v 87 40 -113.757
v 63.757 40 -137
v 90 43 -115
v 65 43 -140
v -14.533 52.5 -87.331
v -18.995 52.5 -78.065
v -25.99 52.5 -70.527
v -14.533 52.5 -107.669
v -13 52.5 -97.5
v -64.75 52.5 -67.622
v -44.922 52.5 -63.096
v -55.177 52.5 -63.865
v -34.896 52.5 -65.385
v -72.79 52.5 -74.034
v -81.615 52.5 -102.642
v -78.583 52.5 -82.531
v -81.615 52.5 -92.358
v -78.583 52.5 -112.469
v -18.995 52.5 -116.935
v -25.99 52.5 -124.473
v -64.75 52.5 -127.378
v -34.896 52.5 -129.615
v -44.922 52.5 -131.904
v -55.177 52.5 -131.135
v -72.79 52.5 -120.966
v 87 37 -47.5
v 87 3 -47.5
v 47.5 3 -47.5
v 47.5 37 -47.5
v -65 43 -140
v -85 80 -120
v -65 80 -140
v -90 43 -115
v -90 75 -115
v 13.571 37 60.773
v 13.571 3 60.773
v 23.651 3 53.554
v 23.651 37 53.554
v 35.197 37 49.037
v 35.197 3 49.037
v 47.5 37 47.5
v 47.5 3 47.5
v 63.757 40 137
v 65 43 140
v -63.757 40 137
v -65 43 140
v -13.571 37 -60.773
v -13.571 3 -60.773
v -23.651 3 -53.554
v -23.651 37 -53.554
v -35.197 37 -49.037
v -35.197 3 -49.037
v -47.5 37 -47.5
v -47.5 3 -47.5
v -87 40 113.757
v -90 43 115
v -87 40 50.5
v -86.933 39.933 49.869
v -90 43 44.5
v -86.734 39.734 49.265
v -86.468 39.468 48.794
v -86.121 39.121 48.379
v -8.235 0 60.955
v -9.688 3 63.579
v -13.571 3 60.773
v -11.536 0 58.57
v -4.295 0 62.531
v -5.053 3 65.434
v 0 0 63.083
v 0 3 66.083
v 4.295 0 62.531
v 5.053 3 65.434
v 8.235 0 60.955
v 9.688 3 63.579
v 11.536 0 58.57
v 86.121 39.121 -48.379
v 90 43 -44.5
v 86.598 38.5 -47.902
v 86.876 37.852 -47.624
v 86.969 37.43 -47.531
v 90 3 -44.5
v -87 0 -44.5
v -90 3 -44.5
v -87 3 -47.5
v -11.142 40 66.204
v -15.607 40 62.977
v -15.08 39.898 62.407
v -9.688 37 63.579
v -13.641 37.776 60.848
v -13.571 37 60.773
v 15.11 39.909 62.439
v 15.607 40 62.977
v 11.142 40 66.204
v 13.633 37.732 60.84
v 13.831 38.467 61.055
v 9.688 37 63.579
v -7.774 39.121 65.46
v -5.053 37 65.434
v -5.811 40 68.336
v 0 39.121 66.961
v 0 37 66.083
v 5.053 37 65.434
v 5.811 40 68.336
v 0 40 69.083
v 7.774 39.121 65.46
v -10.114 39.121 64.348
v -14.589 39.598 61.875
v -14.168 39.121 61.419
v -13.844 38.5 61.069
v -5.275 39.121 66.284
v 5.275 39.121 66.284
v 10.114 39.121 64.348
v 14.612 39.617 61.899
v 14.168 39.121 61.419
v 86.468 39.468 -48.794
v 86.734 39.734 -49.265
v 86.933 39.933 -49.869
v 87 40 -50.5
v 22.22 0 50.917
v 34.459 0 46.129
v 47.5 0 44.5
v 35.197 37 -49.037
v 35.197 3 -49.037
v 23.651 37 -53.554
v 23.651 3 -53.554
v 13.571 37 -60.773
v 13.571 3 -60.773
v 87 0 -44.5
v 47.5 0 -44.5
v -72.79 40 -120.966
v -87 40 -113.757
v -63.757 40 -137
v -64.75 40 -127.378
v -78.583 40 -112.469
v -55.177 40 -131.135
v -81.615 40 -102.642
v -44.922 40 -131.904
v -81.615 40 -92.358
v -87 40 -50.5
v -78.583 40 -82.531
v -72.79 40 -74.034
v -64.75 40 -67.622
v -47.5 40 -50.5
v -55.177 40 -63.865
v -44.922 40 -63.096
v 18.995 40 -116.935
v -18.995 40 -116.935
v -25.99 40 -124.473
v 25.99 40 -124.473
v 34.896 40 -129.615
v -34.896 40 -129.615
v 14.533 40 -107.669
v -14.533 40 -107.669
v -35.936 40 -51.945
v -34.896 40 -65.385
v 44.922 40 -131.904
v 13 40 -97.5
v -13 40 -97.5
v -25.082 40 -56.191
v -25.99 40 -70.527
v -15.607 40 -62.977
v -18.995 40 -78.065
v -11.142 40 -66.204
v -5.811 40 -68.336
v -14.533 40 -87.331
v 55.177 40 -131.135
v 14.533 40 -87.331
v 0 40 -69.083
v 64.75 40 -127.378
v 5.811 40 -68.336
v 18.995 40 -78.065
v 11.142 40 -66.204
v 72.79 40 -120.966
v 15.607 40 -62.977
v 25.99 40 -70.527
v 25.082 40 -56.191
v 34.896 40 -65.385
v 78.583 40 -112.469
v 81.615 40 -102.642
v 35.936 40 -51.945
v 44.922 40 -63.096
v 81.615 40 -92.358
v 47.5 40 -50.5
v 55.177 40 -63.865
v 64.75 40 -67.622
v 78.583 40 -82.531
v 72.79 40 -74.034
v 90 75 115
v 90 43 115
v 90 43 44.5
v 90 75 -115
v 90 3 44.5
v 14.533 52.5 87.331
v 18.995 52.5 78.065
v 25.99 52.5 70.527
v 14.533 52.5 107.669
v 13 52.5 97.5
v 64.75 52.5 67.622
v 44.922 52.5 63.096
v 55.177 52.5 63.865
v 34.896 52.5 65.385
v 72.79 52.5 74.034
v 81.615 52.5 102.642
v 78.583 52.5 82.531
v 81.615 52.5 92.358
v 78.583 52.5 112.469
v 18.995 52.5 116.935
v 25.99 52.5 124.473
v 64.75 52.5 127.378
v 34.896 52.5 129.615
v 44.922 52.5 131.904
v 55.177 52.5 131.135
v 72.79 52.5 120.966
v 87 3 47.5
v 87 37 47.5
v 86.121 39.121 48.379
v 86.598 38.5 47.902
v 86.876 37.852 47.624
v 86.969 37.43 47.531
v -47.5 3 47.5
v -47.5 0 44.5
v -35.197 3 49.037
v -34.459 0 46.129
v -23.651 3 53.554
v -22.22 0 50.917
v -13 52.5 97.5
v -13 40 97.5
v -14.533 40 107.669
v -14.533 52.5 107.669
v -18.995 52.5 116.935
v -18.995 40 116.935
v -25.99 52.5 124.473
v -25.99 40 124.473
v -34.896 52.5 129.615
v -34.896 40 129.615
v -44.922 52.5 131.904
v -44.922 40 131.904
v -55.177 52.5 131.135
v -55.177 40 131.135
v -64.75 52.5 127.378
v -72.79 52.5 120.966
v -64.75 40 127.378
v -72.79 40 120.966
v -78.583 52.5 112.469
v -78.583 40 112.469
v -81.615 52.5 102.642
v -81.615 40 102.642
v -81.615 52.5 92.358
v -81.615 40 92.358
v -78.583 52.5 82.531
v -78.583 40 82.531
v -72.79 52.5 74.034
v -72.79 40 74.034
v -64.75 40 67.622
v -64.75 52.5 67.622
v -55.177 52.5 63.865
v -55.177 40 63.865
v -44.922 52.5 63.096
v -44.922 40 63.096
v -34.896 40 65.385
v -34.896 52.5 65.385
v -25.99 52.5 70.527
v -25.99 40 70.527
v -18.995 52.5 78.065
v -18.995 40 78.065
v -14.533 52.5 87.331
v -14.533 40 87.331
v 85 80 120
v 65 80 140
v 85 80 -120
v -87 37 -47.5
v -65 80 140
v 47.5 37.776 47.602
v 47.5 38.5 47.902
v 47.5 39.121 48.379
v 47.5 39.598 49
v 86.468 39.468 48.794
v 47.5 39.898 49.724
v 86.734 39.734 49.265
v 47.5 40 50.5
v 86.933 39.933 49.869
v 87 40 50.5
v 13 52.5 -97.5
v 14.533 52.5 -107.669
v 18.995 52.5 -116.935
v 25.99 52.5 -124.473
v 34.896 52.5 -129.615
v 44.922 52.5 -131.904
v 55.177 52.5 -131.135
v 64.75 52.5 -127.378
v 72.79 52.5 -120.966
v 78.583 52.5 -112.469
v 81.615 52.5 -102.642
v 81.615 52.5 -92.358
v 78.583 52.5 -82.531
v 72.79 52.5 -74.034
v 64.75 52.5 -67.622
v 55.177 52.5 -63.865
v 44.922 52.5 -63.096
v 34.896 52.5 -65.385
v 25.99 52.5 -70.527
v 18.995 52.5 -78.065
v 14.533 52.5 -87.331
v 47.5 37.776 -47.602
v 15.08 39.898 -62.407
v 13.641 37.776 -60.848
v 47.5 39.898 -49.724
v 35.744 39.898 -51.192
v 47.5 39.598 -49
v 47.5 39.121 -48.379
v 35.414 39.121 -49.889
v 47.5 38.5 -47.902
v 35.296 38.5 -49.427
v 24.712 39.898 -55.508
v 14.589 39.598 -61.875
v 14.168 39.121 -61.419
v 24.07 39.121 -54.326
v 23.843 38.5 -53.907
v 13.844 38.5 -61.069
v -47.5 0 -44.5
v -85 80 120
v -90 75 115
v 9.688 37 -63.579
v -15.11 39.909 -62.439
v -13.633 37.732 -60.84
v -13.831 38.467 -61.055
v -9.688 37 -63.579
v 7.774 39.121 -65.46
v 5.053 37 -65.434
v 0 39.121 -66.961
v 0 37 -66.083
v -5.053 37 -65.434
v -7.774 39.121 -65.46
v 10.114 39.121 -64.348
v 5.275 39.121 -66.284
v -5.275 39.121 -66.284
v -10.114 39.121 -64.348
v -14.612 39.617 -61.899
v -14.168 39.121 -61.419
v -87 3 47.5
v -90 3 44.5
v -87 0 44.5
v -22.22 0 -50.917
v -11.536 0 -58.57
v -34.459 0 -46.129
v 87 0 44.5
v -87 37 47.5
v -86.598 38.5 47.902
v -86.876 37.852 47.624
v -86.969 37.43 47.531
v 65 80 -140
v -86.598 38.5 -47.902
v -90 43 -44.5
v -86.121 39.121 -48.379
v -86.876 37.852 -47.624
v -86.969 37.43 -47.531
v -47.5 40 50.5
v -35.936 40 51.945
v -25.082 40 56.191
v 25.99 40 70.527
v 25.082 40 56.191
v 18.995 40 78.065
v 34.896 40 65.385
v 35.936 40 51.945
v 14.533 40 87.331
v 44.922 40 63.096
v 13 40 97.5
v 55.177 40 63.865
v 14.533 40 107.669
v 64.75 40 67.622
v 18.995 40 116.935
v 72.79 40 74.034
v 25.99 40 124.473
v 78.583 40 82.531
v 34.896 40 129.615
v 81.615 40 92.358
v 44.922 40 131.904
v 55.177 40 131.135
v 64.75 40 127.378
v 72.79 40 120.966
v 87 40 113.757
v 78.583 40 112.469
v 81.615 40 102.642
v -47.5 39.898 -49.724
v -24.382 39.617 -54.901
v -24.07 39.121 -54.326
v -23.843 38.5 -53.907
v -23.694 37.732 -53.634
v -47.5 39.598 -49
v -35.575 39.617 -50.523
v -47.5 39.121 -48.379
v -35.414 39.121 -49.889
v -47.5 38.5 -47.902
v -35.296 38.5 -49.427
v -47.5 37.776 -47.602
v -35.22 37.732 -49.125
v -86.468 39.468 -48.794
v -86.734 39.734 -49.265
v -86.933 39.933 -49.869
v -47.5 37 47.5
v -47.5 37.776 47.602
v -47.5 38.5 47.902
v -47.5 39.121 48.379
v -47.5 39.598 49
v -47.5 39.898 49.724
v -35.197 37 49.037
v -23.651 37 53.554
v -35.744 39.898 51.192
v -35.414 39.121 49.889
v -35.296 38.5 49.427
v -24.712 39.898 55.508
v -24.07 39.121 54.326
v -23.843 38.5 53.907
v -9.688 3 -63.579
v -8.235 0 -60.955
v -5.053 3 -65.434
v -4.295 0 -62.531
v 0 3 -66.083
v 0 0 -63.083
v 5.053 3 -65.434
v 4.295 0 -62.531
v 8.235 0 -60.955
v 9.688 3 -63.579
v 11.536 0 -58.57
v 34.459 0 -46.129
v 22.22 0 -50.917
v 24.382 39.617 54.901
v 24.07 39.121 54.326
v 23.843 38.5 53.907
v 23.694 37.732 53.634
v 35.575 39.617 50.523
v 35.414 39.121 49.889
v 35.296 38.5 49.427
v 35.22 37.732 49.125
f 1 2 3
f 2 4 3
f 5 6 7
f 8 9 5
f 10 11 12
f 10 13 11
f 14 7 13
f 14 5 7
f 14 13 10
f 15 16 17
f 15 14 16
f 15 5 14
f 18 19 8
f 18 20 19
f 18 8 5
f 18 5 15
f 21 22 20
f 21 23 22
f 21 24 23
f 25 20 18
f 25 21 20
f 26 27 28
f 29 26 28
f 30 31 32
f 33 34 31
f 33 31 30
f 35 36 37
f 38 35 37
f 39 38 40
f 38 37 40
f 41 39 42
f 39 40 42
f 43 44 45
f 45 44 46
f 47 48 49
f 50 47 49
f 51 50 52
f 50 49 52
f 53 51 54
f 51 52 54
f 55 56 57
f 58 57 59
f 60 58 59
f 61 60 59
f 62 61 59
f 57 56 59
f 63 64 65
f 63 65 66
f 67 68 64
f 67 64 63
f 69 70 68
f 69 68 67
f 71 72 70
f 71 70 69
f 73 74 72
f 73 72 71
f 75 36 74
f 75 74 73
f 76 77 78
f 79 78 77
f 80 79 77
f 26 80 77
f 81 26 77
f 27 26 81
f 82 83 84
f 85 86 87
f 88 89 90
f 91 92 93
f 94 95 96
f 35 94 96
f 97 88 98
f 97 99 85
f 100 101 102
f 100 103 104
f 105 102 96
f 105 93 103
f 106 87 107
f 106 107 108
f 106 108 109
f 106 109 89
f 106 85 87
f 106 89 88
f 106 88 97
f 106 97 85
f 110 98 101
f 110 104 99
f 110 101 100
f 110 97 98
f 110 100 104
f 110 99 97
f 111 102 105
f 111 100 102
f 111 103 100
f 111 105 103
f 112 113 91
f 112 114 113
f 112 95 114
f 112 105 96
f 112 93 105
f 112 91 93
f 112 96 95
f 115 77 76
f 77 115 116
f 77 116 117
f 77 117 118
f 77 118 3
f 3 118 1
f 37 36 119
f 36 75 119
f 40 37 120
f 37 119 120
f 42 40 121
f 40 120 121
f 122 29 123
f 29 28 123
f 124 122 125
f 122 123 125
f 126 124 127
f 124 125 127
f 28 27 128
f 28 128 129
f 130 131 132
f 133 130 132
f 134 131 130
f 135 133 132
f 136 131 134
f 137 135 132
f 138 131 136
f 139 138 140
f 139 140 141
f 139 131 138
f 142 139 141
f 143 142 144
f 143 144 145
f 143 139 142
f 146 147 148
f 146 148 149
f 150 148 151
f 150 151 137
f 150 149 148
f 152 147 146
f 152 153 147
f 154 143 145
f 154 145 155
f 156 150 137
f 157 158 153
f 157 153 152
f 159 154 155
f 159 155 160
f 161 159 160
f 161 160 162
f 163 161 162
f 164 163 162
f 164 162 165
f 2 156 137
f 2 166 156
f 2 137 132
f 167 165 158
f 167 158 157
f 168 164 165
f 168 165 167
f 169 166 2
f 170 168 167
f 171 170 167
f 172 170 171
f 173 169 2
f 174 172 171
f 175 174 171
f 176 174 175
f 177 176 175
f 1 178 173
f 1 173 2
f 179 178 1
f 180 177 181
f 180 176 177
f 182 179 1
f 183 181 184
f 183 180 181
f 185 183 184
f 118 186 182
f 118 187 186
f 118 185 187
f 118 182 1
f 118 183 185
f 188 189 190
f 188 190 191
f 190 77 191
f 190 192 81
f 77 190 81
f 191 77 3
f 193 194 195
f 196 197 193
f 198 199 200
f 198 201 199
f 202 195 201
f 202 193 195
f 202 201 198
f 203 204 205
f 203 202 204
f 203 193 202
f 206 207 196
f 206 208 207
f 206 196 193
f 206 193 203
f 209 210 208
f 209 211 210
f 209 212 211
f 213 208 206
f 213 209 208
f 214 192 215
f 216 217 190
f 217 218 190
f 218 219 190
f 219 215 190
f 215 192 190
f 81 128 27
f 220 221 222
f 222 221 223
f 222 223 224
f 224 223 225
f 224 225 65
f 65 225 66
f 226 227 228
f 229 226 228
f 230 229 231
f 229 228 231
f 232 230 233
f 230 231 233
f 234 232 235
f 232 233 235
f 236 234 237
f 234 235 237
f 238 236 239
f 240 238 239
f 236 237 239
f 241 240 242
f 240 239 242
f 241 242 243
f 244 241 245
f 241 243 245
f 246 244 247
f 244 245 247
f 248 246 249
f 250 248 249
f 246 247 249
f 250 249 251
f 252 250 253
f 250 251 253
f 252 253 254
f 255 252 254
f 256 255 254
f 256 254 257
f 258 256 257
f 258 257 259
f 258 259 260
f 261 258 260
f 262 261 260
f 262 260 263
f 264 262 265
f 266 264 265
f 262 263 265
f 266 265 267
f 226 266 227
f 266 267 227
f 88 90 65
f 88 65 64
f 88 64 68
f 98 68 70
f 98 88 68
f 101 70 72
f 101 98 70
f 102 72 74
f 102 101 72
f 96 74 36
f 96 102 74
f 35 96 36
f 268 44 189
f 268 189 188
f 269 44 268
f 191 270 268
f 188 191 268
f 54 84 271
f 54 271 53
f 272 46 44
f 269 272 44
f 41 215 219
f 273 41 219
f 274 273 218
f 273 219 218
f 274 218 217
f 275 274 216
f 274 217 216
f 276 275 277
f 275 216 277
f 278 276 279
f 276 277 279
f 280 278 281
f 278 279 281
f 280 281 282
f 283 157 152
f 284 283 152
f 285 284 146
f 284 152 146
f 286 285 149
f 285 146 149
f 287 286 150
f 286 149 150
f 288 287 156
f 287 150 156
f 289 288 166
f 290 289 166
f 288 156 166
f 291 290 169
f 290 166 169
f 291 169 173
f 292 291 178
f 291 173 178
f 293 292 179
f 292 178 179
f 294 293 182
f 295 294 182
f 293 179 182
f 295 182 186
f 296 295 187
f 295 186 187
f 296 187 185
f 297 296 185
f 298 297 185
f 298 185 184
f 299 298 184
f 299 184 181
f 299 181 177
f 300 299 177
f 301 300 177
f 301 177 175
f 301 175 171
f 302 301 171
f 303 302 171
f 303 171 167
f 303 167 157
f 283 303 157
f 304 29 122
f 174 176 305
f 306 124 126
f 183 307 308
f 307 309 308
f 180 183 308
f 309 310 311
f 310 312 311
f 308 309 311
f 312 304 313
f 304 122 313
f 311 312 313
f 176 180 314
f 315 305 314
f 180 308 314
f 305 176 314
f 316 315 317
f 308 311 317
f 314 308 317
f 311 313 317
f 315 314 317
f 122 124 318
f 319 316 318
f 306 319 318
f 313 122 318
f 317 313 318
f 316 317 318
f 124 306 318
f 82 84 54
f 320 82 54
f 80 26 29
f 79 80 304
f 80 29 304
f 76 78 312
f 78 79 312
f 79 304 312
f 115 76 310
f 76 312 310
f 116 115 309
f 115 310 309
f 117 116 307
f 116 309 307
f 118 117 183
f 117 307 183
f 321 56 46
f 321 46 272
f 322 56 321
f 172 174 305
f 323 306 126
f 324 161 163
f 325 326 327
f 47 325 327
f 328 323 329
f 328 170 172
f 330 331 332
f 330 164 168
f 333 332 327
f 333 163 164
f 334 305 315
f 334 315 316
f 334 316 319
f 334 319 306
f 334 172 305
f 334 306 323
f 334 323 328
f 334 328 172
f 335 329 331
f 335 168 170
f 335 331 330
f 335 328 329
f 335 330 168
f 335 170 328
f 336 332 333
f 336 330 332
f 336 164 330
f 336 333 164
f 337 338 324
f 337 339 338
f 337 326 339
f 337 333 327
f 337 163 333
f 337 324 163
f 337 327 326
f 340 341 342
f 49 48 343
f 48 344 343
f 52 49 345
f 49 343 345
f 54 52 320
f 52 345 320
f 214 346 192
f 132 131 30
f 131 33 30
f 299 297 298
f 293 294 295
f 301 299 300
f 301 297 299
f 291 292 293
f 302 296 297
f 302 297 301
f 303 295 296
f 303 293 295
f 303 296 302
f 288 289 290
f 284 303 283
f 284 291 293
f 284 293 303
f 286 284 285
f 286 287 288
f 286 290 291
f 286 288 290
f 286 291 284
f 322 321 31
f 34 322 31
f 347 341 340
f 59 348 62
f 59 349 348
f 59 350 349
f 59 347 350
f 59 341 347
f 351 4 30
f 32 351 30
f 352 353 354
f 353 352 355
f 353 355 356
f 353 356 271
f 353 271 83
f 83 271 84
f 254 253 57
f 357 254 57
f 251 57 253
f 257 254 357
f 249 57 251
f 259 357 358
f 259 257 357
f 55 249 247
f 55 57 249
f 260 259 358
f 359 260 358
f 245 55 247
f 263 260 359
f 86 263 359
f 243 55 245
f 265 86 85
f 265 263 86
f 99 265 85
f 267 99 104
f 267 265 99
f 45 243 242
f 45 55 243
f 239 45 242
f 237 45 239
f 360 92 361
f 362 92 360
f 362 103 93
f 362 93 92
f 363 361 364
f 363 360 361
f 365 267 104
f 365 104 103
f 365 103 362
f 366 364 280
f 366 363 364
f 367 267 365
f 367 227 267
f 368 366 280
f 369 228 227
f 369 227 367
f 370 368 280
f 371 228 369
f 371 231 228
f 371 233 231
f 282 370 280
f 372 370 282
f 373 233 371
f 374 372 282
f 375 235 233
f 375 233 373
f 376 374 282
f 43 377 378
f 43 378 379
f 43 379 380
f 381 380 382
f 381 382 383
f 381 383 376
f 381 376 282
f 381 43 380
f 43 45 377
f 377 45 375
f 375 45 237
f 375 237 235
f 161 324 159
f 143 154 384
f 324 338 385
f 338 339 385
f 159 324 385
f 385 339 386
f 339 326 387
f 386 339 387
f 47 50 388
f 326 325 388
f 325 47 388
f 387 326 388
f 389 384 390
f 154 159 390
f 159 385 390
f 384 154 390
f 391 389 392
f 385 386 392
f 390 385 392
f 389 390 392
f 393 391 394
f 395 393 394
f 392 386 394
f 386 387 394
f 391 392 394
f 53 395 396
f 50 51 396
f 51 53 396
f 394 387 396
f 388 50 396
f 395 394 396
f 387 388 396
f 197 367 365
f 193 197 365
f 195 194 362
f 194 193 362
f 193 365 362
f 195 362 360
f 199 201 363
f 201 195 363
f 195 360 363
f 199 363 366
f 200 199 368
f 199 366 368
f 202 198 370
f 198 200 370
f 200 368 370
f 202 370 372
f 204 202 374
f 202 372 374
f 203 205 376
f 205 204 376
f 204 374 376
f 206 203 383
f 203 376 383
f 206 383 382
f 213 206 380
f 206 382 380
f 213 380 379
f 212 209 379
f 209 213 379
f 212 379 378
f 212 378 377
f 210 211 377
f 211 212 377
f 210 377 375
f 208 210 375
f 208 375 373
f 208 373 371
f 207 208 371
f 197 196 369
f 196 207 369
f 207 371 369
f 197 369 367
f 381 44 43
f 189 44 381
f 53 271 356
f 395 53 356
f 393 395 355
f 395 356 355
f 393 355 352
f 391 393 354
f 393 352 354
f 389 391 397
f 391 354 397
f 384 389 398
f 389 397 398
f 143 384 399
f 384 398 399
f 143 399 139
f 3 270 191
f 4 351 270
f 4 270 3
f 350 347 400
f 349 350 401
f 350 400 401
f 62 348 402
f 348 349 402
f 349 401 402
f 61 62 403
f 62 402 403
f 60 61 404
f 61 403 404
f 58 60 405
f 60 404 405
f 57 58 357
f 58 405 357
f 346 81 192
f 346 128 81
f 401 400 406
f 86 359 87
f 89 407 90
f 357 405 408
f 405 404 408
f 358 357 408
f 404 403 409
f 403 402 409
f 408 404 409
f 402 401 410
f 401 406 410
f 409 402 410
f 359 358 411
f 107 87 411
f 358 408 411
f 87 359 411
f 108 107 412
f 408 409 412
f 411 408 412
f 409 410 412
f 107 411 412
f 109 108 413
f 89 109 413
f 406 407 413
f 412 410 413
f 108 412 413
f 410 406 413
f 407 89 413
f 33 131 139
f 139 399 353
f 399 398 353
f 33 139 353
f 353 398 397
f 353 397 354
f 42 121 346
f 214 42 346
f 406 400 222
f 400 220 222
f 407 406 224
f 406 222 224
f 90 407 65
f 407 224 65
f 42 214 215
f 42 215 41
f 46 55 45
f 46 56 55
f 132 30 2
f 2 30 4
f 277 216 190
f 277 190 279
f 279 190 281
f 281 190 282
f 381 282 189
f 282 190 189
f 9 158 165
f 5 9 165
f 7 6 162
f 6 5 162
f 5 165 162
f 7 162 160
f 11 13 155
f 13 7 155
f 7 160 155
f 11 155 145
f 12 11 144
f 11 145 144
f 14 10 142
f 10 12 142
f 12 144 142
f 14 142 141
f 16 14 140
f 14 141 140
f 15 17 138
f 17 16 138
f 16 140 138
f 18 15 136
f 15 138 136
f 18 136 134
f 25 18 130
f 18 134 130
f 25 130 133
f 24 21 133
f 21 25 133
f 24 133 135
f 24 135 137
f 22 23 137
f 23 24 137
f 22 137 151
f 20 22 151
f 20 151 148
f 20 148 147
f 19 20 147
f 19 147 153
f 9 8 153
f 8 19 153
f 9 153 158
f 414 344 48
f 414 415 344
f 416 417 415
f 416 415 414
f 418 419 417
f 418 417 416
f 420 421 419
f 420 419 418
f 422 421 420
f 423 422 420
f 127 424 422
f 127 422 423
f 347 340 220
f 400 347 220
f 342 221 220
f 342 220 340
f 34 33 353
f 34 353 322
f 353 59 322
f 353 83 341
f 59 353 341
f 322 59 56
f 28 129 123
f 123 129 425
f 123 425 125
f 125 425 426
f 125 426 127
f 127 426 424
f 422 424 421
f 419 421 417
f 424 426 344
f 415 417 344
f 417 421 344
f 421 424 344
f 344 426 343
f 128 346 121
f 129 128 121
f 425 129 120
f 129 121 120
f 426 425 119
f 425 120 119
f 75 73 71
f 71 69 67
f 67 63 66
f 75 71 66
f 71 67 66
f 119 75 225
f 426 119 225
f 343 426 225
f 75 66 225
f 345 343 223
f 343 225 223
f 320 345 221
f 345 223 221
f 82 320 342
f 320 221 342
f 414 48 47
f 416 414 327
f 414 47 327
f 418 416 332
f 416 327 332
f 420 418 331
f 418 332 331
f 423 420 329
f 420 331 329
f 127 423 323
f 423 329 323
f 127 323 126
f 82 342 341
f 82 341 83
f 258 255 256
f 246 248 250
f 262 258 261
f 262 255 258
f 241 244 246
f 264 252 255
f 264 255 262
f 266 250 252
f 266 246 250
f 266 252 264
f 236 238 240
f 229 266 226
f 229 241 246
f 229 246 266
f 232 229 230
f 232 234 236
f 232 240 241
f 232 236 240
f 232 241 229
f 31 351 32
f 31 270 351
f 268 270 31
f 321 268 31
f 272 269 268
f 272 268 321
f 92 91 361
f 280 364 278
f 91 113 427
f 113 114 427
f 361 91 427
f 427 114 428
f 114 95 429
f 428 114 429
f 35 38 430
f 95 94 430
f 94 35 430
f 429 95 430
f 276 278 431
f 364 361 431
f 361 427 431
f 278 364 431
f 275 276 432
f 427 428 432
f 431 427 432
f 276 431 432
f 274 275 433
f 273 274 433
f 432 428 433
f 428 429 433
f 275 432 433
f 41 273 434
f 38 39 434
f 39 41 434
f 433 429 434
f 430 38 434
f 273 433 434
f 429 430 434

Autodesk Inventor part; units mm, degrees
ref_plane "YZ Plane" through (0, 0, 0) normal (1, 0, 0) x (0, 1, 0)
ref_plane "XZ Plane" through (0, 0, 0) normal (0, 1, 0) x (-1, 0, 0)
ref_plane "XY Plane" through (0, 0, 0) normal (0, 0, 1) x (1, 0, 0)
sketch "Sketch1" plane through (0, 0, 0) normal (0, 1, 0) x (-1, 0, 0)
  line L0 (-90, -140) -> (90, -140)
  line L1 (90, -140) -> (90, 140)
  line L2 (90, 140) -> (-90, 140)
  line L3 (-90, 140) -> (-90, -140)
  line L4 (-90, -140) -> (90, 140) construction
  line L5 (90, -140) -> (-90, 140) construction
  point P0 (0, 0)
  dimension "d0" = 280
  dimension "d1" = 180
extrude "Extrusion1" add sketch "Sketch1" along normal blind 80
sketch "Sketch2" plane through (0, 0, 0) normal (0, -1, 0) x (1, 0, 0)
  arc A0 (-47.5, 47.5) -> (2.5, 97.5) centre (-47.5, 97.5) ccw
  line L0 (0, 150) -> (0, -153.5615) construction
  line L1 (-95.9498, 0) -> (75.0535, 0) construction
  line L2 (2.5, 97.5) -> (2.5, 140)
  line L3 (-90, 47.5) -> (-47.5, 47.5)
  line L4 (-90, -140) -> (-90, 140) projected
  line L5 (-90, 47.5) -> (-90, 140)
  line L6 (-90, 140) -> (90, 140) projected
  line L7 (2.5, 140) -> (-90, 140)
  arc A1 (-2.5, 97.5) -> (47.5, 47.5) centre (47.5, 97.5) ccw
  line L8 (-2.5, 97.5) -> (-2.5, 140)
  line L9 (90, 47.5) -> (47.5, 47.5)
  line L10 (90, -140) -> (90, 140)
  line L11 (90, 140) -> (-90, 140)
  arc A2 (2.5, -97.5) -> (-47.5, -47.5) centre (-47.5, -97.5) ccw
  line L12 (2.5, -97.5) -> (2.5, -140)
  line L13 (-90, -47.5) -> (-47.5, -47.5)
  line L14 (-90, 140) -> (-90, -140)
  line L15 (-90, -140) -> (90, -140)
  line L16 (90, 140) -> (90, -140)
  line L17 (90, -47.5) -> (47.5, -47.5)
  arc A3 (47.5, -47.5) -> (-2.5, -97.5) centre (47.5, -97.5) ccw
  line L18 (-2.5, -97.5) -> (-2.5, -140)
  circle A4 centre (-47.5, 97.5) radius 34.5
  circle A5 centre (-47.5, 97.5) radius 42 construction
  line L19 (-89.5, 97.5) -> (-5.5, 97.5) construction
  line L20 (-47.5, 139.5) -> (-47.5, 55.5) construction
  line L21 (-77.1985, 127.1985) -> (-17.8015, 67.8015) construction
  line L22 (-17.8015, 127.1985) -> (-77.1985, 67.8015) construction
  point P0 (0, 0)
  point P1 (-2.5, -140)
  point P2 (90, -47.5)
  point P3 (-90, -47.5)
  point P4 (-2.5, 140)
  point P5 (75, -50)
  point P6 (-75, -50)
  dimension "d15" = 84
  dimension "d7" = 90
  dimension "d11" = 50
  dimension "d14" = 69
  dimension "d16" = 45
  dimension "d17" = 45
  dimension "d35" = 42.5
  dimension "d36" = 42.5
extrude "Extrusion2" cut sketch "Sketch2" against normal blind 40 contours L3 L4 L6 L8 A1 A0 | A1 L8 L6 L2 A0 | A0 L2 L6 L10 L9 A1 | L13 A2 A3 L18 L15 L4 | L10 L15 L12 A2 A3 L17 | L18 A3 A2 L12 L15 | A4
extrude "Extrusion3" cut sketch "Sketch2" against normal blind 12.5 from surface at -40 contours A4
mirror "Mirror1" about plane through (0, 0, 0) normal (0, 0, 1) of "Extrusion3"
mirror "Mirror2" about plane through (0, 0, 0) normal (1, 0, 0) of "Extrusion3", "Mirror1"
chamfer "Chamfer1" distance 25 angle 45 4 edges at (90, 60, 140) (-90, 60, 140) (90, 60, -140) (-90, 60, -140)
fillet "Fillet1" radius 20 2 edges at (0, 20, 81.8875) (0, 20, -81.8875)
chamfer "Chamfer2" distance 3 angle 45 26 edges at (0, 40, -140) (77.5, 40, -127.5) (90, 40, -81.25) (-77.5, 40, -127.5) (-90, 40, -81.25) (90, 40, 81.25) (77.5, 40, 127.5) (0, 40, 140) (-77.5, 40, 127.5) (-90, 40, 81.25) (-90, 0, 0) (-90, 20, 47.5) (-90, 20, -47.5) (-68.75, 0, -47.5) (-29.2837, 0, -50.9364) (0, 0, -66.0826) (29.2837, 0, -50.9364) (68.75, 0, -47.5) (-68.75, 0, 47.5) (-29.2837, 0, 50.9364) (0, 0, 66.0826) (29.2837, 0, 50.9364) (68.75, 0, 47.5) (90, 0, 0) (90, 20, -47.5) (90, 20, 47.5)
fillet "Fillet2" radius 3 8 edges at (29.2837, 40, -50.9364) (-29.2837, 40, -50.9364) (-67.25, 40, -47.5) (67.25, 40, -47.5) (29.2837, 40, 50.9364) (-29.2837, 40, 50.9364) (-67.25, 40, 47.5) (67.25, 40, 47.5)
chamfer "Chamfer4" distance 5 angle 45 2 edges at (90, 80, 0) (-90, 80, 0)
